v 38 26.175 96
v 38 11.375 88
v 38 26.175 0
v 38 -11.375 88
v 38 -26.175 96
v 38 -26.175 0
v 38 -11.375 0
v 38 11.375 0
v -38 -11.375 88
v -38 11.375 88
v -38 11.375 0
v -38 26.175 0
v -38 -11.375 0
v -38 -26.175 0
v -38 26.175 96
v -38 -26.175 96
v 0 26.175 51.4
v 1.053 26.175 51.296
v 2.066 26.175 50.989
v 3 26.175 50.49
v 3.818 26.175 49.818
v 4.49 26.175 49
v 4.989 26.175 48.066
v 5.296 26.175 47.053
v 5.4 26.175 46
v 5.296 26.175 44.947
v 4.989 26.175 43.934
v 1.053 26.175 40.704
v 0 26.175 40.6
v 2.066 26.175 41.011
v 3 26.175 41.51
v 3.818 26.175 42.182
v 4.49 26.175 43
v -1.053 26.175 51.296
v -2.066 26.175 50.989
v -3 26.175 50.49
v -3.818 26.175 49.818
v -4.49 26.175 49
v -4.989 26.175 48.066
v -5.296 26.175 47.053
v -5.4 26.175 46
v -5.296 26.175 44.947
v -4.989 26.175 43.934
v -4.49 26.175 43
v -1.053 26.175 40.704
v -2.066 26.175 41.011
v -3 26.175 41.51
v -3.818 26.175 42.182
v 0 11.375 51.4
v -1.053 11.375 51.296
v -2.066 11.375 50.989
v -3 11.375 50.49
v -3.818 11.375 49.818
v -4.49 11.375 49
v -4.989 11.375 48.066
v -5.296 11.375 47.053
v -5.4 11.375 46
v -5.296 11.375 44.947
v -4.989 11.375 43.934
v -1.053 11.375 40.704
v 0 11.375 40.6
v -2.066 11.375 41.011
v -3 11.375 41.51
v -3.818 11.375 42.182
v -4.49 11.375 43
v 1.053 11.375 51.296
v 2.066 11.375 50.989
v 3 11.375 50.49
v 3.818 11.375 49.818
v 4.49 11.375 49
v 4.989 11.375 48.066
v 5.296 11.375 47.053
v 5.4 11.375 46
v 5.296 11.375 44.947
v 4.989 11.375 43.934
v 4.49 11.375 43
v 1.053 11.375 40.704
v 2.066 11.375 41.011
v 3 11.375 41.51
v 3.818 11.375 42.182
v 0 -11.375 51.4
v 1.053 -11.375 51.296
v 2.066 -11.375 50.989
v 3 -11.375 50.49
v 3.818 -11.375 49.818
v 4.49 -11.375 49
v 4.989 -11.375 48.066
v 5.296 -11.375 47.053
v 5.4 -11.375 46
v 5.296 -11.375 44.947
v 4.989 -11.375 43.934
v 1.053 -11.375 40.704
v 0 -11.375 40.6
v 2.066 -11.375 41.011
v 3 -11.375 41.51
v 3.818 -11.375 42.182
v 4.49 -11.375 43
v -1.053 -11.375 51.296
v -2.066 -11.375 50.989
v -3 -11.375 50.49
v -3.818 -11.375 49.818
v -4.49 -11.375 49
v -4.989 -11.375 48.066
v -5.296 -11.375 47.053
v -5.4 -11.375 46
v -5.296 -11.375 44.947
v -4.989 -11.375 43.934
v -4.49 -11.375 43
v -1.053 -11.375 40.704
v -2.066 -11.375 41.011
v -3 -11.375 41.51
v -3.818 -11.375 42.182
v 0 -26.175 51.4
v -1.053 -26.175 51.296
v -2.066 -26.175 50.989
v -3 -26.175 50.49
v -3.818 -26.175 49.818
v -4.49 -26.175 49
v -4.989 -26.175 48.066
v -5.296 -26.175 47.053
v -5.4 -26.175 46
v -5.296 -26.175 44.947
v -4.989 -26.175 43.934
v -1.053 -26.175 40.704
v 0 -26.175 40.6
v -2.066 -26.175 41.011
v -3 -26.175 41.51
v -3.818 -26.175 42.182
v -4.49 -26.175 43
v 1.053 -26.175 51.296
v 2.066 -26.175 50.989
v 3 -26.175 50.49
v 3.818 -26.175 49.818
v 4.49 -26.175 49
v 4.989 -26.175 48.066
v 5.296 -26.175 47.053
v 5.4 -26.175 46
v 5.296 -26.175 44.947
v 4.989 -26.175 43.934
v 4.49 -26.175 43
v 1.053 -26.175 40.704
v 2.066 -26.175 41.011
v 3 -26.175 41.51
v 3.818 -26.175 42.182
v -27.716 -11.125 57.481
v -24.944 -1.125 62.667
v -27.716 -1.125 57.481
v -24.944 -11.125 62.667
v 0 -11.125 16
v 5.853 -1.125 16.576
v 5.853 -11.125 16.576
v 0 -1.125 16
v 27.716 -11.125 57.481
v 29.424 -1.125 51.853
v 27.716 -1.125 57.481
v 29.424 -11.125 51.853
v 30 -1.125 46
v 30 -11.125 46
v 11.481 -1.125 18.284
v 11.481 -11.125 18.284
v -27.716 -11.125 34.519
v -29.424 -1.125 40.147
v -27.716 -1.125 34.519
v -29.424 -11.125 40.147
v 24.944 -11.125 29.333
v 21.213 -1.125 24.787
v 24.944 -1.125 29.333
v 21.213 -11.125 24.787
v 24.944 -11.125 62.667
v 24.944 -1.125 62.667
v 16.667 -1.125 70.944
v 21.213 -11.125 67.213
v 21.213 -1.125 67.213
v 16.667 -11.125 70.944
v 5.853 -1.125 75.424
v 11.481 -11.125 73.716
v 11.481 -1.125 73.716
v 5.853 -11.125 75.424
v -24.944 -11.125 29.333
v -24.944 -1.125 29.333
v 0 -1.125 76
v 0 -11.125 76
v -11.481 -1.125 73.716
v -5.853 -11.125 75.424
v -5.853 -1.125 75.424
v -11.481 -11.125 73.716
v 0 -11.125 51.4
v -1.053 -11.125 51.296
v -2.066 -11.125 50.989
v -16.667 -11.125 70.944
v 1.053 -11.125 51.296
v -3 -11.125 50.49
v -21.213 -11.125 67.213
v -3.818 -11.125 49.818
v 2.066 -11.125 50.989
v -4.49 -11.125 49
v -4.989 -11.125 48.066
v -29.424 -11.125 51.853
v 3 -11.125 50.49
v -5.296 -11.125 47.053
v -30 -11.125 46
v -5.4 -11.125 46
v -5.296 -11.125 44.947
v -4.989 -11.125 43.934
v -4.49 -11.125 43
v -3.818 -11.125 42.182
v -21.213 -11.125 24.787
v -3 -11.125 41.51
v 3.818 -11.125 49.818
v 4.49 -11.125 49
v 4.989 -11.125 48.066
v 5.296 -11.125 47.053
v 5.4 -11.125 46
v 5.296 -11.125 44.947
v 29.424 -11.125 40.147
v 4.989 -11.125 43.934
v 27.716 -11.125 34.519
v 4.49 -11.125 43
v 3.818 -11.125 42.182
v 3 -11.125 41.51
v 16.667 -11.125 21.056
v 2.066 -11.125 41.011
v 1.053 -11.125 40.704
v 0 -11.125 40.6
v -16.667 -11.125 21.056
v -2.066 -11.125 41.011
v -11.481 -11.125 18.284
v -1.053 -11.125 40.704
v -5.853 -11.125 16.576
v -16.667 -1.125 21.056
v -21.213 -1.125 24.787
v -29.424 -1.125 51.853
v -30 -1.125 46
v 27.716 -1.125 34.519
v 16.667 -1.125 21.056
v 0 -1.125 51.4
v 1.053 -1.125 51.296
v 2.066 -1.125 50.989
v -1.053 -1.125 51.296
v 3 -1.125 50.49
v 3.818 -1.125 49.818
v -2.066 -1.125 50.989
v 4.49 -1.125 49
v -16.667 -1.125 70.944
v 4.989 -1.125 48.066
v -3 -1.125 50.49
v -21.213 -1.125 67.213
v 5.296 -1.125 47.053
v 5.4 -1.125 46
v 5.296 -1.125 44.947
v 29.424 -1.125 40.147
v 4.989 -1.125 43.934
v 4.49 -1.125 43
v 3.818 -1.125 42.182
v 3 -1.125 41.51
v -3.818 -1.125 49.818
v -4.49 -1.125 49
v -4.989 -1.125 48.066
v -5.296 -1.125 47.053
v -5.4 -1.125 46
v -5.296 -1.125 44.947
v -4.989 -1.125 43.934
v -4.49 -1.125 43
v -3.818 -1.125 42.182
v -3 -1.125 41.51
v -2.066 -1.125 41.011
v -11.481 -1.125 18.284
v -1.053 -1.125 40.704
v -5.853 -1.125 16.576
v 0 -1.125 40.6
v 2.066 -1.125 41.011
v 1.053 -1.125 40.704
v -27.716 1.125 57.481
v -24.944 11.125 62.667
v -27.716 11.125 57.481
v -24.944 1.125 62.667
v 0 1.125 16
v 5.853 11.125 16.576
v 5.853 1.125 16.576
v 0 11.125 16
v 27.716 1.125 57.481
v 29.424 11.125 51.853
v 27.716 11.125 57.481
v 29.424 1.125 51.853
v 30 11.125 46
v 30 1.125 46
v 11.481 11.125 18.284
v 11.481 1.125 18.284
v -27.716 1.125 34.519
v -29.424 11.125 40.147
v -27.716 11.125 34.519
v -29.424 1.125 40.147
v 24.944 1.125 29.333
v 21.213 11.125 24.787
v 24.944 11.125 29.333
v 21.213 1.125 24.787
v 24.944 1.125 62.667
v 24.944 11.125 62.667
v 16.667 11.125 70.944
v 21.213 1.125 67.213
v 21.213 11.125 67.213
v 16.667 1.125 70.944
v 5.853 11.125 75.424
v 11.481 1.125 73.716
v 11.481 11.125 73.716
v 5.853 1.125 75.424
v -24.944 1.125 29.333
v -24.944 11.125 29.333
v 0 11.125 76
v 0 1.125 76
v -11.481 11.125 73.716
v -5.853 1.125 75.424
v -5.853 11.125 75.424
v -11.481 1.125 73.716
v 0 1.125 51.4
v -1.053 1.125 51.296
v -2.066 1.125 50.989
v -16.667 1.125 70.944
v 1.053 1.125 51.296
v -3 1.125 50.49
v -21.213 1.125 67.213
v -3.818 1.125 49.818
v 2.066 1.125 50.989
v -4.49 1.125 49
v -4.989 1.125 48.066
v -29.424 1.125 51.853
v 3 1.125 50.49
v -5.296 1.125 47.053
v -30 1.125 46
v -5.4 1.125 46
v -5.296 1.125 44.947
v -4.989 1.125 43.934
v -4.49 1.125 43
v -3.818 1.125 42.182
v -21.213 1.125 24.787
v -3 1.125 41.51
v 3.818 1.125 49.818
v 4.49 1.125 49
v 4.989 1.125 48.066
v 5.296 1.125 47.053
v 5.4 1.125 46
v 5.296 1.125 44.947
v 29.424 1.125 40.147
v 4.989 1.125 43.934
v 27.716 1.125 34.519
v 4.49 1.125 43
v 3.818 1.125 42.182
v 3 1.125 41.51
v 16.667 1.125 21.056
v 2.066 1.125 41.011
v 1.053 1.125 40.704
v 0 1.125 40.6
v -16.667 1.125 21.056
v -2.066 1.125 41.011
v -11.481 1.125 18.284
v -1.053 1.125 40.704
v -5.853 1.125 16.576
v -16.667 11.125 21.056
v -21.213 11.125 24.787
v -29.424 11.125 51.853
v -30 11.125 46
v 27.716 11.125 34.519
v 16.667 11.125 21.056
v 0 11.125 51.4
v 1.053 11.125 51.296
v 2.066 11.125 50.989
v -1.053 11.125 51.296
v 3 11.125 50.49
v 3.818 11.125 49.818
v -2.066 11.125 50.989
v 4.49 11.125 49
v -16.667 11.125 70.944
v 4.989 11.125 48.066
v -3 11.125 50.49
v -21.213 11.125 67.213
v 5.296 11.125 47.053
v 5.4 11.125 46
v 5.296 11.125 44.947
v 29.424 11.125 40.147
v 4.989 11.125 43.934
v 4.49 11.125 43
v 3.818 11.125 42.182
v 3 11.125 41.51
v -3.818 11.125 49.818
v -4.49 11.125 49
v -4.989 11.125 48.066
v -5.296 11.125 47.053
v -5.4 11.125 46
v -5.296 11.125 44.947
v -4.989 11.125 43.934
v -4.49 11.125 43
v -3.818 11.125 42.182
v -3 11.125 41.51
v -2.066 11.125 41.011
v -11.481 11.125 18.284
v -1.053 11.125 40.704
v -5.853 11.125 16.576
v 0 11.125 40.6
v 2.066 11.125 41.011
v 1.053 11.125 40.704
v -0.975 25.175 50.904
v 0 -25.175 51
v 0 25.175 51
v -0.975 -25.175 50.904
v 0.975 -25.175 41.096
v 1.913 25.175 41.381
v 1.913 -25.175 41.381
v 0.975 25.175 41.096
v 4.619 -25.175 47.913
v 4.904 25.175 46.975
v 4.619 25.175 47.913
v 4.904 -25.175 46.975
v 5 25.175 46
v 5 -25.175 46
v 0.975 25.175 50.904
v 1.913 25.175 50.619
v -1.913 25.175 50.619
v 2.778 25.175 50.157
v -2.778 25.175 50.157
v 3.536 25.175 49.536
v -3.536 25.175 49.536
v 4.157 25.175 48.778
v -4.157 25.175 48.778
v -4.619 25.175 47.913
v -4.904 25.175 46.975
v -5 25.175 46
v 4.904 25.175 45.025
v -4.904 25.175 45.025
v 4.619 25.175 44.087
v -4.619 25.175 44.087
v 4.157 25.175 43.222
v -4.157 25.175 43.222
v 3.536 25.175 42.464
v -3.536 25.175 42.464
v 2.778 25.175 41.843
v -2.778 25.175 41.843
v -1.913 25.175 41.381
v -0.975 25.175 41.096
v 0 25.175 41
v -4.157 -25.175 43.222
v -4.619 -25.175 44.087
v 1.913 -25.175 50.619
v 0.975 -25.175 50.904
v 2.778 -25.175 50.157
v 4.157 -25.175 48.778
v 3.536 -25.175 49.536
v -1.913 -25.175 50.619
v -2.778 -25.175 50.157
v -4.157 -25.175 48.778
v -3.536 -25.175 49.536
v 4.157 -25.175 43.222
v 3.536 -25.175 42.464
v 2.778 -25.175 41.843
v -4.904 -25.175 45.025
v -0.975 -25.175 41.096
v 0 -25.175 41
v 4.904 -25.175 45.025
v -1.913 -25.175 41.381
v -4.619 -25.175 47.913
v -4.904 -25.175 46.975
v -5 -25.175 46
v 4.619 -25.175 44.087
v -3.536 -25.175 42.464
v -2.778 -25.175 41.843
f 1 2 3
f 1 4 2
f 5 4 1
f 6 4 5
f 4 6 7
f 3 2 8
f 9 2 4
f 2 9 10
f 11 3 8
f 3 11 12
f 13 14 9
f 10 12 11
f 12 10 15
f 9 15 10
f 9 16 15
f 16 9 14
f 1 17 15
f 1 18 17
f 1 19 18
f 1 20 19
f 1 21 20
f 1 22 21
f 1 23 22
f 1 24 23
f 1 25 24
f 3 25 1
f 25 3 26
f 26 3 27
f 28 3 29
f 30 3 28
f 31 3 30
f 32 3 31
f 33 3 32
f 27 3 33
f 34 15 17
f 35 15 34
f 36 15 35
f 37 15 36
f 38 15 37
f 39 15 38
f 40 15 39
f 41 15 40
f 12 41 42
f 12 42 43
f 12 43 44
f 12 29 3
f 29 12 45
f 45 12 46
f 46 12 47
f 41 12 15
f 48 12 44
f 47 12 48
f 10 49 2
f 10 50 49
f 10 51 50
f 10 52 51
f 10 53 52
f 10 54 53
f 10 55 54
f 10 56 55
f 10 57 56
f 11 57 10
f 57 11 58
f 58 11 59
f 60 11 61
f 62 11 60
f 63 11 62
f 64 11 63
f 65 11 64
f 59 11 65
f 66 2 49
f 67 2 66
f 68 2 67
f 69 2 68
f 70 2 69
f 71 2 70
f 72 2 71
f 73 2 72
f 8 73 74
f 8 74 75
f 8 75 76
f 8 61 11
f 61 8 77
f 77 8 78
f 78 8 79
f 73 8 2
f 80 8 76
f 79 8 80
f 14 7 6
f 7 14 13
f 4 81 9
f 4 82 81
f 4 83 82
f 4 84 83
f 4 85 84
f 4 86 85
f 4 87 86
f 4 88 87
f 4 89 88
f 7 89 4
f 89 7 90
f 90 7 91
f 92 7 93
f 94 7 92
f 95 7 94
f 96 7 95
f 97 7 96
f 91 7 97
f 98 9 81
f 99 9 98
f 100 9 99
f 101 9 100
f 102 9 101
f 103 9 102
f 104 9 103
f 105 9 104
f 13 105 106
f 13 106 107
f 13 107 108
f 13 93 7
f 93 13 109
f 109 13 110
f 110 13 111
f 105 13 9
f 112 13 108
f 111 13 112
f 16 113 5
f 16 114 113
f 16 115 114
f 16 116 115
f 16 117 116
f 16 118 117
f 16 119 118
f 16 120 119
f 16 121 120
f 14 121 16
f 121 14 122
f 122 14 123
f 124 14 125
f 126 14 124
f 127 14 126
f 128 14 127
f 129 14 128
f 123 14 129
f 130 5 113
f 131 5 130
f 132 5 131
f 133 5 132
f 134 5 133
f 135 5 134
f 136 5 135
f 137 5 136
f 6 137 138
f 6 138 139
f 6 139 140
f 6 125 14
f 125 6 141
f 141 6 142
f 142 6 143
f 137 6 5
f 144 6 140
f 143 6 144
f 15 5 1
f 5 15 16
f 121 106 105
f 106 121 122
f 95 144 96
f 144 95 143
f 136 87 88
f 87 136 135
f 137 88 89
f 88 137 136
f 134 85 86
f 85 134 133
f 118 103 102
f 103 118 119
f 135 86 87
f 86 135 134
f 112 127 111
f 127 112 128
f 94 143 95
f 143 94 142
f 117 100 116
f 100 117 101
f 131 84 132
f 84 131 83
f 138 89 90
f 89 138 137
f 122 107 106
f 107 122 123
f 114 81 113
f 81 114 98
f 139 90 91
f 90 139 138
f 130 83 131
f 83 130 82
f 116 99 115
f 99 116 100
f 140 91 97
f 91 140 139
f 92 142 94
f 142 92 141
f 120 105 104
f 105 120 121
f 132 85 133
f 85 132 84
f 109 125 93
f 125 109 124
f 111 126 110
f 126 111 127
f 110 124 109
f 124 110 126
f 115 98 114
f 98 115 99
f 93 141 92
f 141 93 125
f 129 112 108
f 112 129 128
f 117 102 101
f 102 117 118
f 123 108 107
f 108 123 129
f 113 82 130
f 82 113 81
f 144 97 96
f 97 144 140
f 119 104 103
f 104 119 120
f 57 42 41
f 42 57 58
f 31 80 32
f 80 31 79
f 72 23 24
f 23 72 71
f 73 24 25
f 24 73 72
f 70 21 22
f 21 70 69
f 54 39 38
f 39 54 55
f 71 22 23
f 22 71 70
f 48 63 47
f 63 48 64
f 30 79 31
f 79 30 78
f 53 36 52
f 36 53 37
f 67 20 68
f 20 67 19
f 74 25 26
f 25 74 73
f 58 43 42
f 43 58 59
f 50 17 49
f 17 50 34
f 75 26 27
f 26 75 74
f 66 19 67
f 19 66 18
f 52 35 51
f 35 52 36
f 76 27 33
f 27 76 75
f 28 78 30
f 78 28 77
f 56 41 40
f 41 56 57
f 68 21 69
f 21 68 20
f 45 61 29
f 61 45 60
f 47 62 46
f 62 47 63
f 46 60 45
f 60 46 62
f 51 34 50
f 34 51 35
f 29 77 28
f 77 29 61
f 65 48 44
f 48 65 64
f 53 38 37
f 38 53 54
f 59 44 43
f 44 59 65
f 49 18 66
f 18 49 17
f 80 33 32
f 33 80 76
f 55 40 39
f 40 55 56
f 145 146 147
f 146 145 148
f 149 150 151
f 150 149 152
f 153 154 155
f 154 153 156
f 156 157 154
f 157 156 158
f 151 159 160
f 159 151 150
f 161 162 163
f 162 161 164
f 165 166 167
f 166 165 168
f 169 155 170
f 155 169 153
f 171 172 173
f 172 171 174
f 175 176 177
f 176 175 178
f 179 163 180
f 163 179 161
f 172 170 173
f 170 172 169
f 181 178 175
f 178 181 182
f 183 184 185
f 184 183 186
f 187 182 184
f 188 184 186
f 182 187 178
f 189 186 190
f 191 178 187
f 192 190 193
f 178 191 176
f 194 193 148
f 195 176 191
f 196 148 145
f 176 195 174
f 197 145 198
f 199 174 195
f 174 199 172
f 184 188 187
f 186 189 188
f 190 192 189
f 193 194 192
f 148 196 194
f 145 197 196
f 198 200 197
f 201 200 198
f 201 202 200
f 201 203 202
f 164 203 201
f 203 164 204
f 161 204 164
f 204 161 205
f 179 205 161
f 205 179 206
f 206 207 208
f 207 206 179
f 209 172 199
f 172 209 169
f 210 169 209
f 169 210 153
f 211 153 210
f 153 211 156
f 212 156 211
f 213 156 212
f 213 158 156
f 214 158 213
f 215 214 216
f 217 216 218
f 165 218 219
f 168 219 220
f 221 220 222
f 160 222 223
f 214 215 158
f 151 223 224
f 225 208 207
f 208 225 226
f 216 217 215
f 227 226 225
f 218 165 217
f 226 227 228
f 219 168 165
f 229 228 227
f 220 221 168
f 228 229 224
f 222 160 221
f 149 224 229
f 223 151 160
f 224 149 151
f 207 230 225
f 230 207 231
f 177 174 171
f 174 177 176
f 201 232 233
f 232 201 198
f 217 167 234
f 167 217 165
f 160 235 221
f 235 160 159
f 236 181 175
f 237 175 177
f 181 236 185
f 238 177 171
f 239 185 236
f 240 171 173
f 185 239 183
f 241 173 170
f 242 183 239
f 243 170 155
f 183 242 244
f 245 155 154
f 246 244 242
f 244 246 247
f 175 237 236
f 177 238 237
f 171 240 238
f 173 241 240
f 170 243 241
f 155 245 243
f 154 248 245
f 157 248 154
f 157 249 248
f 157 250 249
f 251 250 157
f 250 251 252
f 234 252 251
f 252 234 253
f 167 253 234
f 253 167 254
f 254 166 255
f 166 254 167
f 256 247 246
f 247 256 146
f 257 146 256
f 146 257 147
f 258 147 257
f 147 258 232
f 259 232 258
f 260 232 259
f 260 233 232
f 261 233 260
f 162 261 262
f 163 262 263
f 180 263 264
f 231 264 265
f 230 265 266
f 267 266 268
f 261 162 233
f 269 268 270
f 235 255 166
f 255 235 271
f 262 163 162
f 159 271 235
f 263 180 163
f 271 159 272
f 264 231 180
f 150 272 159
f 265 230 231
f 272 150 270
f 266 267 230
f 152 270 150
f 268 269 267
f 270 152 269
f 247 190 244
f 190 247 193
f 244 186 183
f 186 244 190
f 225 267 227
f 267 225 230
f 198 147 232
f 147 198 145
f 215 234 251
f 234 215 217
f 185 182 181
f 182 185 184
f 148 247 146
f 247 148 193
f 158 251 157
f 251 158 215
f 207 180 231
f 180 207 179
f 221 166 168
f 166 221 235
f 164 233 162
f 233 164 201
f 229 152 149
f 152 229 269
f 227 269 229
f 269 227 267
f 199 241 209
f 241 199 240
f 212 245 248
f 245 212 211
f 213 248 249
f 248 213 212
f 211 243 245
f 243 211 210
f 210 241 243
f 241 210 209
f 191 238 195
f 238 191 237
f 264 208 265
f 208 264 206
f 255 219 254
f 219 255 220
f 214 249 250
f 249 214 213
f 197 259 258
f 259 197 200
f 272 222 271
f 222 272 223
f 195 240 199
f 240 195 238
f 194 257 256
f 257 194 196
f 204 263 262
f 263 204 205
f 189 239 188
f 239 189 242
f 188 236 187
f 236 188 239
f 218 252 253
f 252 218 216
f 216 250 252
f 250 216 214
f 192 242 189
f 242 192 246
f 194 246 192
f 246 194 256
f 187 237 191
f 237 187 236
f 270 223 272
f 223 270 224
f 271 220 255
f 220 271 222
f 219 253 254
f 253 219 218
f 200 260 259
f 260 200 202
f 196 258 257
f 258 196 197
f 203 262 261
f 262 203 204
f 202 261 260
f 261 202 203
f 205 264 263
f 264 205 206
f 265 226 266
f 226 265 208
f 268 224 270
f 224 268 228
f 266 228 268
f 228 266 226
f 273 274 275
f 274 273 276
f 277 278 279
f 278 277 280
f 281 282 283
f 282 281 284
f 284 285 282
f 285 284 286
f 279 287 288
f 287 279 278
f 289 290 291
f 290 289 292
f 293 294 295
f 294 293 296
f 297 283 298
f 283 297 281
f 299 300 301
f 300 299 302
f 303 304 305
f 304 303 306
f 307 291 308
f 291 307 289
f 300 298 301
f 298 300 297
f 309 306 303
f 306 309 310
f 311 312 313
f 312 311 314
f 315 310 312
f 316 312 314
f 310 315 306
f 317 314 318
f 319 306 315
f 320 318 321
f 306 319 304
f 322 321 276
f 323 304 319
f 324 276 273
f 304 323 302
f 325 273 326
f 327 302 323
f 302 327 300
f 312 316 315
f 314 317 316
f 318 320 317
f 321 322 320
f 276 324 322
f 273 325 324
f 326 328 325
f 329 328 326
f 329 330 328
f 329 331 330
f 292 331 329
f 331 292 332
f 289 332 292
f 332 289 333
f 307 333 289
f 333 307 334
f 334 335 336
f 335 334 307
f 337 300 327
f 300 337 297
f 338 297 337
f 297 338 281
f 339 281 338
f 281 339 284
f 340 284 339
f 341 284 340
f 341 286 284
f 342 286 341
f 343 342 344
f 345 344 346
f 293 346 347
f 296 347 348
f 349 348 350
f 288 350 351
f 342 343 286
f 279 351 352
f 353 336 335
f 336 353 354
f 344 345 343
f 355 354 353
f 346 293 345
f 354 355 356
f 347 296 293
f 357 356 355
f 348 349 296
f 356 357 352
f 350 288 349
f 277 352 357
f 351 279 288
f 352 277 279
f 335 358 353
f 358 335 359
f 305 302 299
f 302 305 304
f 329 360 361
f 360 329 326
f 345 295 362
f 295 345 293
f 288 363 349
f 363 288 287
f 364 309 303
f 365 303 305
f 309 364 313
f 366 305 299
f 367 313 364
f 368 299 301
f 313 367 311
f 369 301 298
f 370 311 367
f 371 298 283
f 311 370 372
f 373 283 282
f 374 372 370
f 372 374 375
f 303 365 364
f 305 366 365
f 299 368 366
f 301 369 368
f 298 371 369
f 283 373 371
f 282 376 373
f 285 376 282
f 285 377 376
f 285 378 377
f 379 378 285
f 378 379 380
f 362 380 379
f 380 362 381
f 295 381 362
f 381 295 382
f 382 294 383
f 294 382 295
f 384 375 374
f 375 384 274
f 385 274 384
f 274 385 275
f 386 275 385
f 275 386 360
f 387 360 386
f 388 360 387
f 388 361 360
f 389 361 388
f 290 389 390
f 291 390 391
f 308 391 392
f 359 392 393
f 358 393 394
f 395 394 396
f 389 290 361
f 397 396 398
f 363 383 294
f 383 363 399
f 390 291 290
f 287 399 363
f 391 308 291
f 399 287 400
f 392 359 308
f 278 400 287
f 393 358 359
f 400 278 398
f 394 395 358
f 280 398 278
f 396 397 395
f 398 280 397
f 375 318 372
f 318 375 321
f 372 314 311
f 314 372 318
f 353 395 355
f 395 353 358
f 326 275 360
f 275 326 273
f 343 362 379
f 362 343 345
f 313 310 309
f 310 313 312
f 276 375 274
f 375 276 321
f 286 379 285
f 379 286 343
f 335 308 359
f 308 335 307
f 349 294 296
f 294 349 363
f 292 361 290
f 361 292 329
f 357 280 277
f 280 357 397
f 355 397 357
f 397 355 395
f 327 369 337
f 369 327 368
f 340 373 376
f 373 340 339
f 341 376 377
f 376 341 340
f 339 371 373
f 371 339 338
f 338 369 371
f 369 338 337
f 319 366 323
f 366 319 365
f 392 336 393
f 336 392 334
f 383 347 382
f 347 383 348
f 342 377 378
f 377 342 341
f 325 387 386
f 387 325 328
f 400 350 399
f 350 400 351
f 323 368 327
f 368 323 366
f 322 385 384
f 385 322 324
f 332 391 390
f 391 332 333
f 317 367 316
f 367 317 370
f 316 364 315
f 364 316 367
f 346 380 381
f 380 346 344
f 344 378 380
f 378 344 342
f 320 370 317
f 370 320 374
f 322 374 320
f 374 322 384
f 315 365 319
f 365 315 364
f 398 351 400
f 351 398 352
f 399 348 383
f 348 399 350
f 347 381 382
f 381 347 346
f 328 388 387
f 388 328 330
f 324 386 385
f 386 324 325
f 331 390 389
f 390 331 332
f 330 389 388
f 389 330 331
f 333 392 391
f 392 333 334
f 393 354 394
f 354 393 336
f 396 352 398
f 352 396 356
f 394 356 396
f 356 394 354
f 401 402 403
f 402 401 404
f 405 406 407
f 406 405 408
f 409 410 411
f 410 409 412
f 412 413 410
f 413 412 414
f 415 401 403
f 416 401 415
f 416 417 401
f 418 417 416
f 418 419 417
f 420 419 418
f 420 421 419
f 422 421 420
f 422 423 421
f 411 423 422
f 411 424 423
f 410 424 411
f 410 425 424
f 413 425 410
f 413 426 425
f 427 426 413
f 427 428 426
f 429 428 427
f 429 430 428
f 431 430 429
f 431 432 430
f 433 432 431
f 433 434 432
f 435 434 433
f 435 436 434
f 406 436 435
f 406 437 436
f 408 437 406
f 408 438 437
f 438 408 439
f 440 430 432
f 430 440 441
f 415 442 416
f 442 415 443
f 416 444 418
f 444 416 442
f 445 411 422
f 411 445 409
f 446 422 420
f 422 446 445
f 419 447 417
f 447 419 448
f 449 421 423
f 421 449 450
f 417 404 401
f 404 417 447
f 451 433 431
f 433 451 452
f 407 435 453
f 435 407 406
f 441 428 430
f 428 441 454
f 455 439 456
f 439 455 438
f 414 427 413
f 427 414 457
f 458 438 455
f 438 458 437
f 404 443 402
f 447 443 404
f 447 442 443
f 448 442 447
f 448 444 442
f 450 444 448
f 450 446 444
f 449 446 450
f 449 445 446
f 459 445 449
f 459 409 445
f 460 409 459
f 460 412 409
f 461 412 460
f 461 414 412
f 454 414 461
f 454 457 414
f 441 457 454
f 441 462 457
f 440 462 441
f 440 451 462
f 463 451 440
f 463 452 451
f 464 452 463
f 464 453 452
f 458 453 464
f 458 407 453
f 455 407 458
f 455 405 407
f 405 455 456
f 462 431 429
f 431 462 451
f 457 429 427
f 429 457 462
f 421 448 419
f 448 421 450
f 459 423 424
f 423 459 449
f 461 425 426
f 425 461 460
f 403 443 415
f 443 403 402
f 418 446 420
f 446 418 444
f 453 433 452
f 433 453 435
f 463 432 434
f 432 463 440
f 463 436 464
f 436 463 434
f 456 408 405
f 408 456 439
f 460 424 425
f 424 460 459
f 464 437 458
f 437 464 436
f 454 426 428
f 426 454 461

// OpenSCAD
$fn = 32;

// ------------------------------------------------------------------------
// Trolley wheel set: wheels d60, fork 88 mm tall
// Every part is its own module, assembly() places every instance.
// ------------------------------------------------------------------------

// --- part 1 ---
module trolley_fork() {
  difference() {
    union() {
      translate([-38, 11.375, 0]) cube([76, 14.8, 88]);
      translate([-38, -26.175, 0]) cube([76, 14.8, 88]);
      translate([-38, -26.175, 88]) cube([76, 52.35, 8]);
    }
    translate([0, -18.775, 46]) rotate([90, 0, 0]) cylinder(h = 16.8, d = 10.8, center = true);
    translate([0, 18.775, 46]) rotate([90, 0, 0]) cylinder(h = 16.8, d = 10.8, center = true);
  }
}

// --- part 2 ---
module trolley_wheel() {
  difference() {
      translate([0, 0, 0]) cylinder(h = 10, d = 60);
      translate([0, 0, -1]) cylinder(h = 12, d = 10.8);
    }
}

// --- part 3 ---
module trolley_axle() {
  translate([0, 0, -25.175]) cylinder(h = 50.35, d = 10);
}

// --- assembly ---
module assembly() {
  color([0.80, 0.24, 0.20]) translate([0, 0, 0]) rotate([0, 0, 0]) trolley_fork();
  color([0.20, 0.45, 0.75]) translate([0, -1.125, 46]) rotate([90, 0, 0]) trolley_wheel();
  color([0.25, 0.62, 0.32]) translate([0, 11.125, 46]) rotate([90, 0, 0]) trolley_wheel();
  color([0.92, 0.70, 0.18]) translate([0, 0, 46]) rotate([90, 0, 0]) trolley_axle();
}

assembly();
